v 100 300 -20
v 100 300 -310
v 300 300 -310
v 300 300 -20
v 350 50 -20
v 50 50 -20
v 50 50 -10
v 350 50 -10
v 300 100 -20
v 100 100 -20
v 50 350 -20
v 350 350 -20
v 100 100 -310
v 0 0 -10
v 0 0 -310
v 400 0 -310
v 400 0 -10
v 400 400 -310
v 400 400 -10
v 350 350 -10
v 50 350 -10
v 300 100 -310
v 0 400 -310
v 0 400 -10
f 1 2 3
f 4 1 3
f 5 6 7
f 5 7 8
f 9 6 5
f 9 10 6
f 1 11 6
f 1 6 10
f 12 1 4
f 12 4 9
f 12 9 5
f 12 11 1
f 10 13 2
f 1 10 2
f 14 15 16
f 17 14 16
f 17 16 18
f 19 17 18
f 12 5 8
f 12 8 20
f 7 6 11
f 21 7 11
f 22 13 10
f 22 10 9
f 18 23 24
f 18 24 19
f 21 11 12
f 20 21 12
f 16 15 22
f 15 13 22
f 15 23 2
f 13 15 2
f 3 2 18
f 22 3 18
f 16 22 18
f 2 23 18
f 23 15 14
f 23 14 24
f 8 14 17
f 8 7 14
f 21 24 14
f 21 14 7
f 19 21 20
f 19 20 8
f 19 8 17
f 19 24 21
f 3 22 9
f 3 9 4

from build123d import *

# Parameters (mm, degrees)
BOX007_W     = 300
BOX007_H     = 300
BOX007_DEPTH = 10
BOX006_W     = 200
BOX006_H     = 200
BOX006_DEPTH = 300
BOX005_W     = 400
BOX005_H     = 400
BOX005_DEPTH = 300


with BuildPart() as cube006:
    # Box007 → Box007 (new body)
    with BuildSketch(Plane(origin=(50, 50, -20), x_dir=(1, 0, 0), z_dir=(0, 0, 1))):
        with Locations((150, 150)):
            Rectangle(BOX007_W, BOX007_H)
    extrude(amount=BOX007_DEPTH)


with BuildPart() as cube005:
    # Box006 → Box006 (new body)
    with BuildSketch(Plane(origin=(100, 100, -310), x_dir=(1, 0, 0), z_dir=(0, 0, 1))):
        with Locations((100, 100)):
            Rectangle(BOX006_W, BOX006_H)
    extrude(amount=BOX006_DEPTH)


with BuildPart() as cut003:
    # Box005 → Box005 (new body)
    with BuildSketch(Plane.XY.offset(-310)):
        with Locations((200, 200)):
            Rectangle(BOX005_W, BOX005_H)
    extrude(amount=BOX005_DEPTH)

    # Cut002: cut Cube005
    add(cube005.part, mode=Mode.SUBTRACT)

    # Cut003: cut Cube006
    add(cube006.part, mode=Mode.SUBTRACT)


solid = cut003.part
